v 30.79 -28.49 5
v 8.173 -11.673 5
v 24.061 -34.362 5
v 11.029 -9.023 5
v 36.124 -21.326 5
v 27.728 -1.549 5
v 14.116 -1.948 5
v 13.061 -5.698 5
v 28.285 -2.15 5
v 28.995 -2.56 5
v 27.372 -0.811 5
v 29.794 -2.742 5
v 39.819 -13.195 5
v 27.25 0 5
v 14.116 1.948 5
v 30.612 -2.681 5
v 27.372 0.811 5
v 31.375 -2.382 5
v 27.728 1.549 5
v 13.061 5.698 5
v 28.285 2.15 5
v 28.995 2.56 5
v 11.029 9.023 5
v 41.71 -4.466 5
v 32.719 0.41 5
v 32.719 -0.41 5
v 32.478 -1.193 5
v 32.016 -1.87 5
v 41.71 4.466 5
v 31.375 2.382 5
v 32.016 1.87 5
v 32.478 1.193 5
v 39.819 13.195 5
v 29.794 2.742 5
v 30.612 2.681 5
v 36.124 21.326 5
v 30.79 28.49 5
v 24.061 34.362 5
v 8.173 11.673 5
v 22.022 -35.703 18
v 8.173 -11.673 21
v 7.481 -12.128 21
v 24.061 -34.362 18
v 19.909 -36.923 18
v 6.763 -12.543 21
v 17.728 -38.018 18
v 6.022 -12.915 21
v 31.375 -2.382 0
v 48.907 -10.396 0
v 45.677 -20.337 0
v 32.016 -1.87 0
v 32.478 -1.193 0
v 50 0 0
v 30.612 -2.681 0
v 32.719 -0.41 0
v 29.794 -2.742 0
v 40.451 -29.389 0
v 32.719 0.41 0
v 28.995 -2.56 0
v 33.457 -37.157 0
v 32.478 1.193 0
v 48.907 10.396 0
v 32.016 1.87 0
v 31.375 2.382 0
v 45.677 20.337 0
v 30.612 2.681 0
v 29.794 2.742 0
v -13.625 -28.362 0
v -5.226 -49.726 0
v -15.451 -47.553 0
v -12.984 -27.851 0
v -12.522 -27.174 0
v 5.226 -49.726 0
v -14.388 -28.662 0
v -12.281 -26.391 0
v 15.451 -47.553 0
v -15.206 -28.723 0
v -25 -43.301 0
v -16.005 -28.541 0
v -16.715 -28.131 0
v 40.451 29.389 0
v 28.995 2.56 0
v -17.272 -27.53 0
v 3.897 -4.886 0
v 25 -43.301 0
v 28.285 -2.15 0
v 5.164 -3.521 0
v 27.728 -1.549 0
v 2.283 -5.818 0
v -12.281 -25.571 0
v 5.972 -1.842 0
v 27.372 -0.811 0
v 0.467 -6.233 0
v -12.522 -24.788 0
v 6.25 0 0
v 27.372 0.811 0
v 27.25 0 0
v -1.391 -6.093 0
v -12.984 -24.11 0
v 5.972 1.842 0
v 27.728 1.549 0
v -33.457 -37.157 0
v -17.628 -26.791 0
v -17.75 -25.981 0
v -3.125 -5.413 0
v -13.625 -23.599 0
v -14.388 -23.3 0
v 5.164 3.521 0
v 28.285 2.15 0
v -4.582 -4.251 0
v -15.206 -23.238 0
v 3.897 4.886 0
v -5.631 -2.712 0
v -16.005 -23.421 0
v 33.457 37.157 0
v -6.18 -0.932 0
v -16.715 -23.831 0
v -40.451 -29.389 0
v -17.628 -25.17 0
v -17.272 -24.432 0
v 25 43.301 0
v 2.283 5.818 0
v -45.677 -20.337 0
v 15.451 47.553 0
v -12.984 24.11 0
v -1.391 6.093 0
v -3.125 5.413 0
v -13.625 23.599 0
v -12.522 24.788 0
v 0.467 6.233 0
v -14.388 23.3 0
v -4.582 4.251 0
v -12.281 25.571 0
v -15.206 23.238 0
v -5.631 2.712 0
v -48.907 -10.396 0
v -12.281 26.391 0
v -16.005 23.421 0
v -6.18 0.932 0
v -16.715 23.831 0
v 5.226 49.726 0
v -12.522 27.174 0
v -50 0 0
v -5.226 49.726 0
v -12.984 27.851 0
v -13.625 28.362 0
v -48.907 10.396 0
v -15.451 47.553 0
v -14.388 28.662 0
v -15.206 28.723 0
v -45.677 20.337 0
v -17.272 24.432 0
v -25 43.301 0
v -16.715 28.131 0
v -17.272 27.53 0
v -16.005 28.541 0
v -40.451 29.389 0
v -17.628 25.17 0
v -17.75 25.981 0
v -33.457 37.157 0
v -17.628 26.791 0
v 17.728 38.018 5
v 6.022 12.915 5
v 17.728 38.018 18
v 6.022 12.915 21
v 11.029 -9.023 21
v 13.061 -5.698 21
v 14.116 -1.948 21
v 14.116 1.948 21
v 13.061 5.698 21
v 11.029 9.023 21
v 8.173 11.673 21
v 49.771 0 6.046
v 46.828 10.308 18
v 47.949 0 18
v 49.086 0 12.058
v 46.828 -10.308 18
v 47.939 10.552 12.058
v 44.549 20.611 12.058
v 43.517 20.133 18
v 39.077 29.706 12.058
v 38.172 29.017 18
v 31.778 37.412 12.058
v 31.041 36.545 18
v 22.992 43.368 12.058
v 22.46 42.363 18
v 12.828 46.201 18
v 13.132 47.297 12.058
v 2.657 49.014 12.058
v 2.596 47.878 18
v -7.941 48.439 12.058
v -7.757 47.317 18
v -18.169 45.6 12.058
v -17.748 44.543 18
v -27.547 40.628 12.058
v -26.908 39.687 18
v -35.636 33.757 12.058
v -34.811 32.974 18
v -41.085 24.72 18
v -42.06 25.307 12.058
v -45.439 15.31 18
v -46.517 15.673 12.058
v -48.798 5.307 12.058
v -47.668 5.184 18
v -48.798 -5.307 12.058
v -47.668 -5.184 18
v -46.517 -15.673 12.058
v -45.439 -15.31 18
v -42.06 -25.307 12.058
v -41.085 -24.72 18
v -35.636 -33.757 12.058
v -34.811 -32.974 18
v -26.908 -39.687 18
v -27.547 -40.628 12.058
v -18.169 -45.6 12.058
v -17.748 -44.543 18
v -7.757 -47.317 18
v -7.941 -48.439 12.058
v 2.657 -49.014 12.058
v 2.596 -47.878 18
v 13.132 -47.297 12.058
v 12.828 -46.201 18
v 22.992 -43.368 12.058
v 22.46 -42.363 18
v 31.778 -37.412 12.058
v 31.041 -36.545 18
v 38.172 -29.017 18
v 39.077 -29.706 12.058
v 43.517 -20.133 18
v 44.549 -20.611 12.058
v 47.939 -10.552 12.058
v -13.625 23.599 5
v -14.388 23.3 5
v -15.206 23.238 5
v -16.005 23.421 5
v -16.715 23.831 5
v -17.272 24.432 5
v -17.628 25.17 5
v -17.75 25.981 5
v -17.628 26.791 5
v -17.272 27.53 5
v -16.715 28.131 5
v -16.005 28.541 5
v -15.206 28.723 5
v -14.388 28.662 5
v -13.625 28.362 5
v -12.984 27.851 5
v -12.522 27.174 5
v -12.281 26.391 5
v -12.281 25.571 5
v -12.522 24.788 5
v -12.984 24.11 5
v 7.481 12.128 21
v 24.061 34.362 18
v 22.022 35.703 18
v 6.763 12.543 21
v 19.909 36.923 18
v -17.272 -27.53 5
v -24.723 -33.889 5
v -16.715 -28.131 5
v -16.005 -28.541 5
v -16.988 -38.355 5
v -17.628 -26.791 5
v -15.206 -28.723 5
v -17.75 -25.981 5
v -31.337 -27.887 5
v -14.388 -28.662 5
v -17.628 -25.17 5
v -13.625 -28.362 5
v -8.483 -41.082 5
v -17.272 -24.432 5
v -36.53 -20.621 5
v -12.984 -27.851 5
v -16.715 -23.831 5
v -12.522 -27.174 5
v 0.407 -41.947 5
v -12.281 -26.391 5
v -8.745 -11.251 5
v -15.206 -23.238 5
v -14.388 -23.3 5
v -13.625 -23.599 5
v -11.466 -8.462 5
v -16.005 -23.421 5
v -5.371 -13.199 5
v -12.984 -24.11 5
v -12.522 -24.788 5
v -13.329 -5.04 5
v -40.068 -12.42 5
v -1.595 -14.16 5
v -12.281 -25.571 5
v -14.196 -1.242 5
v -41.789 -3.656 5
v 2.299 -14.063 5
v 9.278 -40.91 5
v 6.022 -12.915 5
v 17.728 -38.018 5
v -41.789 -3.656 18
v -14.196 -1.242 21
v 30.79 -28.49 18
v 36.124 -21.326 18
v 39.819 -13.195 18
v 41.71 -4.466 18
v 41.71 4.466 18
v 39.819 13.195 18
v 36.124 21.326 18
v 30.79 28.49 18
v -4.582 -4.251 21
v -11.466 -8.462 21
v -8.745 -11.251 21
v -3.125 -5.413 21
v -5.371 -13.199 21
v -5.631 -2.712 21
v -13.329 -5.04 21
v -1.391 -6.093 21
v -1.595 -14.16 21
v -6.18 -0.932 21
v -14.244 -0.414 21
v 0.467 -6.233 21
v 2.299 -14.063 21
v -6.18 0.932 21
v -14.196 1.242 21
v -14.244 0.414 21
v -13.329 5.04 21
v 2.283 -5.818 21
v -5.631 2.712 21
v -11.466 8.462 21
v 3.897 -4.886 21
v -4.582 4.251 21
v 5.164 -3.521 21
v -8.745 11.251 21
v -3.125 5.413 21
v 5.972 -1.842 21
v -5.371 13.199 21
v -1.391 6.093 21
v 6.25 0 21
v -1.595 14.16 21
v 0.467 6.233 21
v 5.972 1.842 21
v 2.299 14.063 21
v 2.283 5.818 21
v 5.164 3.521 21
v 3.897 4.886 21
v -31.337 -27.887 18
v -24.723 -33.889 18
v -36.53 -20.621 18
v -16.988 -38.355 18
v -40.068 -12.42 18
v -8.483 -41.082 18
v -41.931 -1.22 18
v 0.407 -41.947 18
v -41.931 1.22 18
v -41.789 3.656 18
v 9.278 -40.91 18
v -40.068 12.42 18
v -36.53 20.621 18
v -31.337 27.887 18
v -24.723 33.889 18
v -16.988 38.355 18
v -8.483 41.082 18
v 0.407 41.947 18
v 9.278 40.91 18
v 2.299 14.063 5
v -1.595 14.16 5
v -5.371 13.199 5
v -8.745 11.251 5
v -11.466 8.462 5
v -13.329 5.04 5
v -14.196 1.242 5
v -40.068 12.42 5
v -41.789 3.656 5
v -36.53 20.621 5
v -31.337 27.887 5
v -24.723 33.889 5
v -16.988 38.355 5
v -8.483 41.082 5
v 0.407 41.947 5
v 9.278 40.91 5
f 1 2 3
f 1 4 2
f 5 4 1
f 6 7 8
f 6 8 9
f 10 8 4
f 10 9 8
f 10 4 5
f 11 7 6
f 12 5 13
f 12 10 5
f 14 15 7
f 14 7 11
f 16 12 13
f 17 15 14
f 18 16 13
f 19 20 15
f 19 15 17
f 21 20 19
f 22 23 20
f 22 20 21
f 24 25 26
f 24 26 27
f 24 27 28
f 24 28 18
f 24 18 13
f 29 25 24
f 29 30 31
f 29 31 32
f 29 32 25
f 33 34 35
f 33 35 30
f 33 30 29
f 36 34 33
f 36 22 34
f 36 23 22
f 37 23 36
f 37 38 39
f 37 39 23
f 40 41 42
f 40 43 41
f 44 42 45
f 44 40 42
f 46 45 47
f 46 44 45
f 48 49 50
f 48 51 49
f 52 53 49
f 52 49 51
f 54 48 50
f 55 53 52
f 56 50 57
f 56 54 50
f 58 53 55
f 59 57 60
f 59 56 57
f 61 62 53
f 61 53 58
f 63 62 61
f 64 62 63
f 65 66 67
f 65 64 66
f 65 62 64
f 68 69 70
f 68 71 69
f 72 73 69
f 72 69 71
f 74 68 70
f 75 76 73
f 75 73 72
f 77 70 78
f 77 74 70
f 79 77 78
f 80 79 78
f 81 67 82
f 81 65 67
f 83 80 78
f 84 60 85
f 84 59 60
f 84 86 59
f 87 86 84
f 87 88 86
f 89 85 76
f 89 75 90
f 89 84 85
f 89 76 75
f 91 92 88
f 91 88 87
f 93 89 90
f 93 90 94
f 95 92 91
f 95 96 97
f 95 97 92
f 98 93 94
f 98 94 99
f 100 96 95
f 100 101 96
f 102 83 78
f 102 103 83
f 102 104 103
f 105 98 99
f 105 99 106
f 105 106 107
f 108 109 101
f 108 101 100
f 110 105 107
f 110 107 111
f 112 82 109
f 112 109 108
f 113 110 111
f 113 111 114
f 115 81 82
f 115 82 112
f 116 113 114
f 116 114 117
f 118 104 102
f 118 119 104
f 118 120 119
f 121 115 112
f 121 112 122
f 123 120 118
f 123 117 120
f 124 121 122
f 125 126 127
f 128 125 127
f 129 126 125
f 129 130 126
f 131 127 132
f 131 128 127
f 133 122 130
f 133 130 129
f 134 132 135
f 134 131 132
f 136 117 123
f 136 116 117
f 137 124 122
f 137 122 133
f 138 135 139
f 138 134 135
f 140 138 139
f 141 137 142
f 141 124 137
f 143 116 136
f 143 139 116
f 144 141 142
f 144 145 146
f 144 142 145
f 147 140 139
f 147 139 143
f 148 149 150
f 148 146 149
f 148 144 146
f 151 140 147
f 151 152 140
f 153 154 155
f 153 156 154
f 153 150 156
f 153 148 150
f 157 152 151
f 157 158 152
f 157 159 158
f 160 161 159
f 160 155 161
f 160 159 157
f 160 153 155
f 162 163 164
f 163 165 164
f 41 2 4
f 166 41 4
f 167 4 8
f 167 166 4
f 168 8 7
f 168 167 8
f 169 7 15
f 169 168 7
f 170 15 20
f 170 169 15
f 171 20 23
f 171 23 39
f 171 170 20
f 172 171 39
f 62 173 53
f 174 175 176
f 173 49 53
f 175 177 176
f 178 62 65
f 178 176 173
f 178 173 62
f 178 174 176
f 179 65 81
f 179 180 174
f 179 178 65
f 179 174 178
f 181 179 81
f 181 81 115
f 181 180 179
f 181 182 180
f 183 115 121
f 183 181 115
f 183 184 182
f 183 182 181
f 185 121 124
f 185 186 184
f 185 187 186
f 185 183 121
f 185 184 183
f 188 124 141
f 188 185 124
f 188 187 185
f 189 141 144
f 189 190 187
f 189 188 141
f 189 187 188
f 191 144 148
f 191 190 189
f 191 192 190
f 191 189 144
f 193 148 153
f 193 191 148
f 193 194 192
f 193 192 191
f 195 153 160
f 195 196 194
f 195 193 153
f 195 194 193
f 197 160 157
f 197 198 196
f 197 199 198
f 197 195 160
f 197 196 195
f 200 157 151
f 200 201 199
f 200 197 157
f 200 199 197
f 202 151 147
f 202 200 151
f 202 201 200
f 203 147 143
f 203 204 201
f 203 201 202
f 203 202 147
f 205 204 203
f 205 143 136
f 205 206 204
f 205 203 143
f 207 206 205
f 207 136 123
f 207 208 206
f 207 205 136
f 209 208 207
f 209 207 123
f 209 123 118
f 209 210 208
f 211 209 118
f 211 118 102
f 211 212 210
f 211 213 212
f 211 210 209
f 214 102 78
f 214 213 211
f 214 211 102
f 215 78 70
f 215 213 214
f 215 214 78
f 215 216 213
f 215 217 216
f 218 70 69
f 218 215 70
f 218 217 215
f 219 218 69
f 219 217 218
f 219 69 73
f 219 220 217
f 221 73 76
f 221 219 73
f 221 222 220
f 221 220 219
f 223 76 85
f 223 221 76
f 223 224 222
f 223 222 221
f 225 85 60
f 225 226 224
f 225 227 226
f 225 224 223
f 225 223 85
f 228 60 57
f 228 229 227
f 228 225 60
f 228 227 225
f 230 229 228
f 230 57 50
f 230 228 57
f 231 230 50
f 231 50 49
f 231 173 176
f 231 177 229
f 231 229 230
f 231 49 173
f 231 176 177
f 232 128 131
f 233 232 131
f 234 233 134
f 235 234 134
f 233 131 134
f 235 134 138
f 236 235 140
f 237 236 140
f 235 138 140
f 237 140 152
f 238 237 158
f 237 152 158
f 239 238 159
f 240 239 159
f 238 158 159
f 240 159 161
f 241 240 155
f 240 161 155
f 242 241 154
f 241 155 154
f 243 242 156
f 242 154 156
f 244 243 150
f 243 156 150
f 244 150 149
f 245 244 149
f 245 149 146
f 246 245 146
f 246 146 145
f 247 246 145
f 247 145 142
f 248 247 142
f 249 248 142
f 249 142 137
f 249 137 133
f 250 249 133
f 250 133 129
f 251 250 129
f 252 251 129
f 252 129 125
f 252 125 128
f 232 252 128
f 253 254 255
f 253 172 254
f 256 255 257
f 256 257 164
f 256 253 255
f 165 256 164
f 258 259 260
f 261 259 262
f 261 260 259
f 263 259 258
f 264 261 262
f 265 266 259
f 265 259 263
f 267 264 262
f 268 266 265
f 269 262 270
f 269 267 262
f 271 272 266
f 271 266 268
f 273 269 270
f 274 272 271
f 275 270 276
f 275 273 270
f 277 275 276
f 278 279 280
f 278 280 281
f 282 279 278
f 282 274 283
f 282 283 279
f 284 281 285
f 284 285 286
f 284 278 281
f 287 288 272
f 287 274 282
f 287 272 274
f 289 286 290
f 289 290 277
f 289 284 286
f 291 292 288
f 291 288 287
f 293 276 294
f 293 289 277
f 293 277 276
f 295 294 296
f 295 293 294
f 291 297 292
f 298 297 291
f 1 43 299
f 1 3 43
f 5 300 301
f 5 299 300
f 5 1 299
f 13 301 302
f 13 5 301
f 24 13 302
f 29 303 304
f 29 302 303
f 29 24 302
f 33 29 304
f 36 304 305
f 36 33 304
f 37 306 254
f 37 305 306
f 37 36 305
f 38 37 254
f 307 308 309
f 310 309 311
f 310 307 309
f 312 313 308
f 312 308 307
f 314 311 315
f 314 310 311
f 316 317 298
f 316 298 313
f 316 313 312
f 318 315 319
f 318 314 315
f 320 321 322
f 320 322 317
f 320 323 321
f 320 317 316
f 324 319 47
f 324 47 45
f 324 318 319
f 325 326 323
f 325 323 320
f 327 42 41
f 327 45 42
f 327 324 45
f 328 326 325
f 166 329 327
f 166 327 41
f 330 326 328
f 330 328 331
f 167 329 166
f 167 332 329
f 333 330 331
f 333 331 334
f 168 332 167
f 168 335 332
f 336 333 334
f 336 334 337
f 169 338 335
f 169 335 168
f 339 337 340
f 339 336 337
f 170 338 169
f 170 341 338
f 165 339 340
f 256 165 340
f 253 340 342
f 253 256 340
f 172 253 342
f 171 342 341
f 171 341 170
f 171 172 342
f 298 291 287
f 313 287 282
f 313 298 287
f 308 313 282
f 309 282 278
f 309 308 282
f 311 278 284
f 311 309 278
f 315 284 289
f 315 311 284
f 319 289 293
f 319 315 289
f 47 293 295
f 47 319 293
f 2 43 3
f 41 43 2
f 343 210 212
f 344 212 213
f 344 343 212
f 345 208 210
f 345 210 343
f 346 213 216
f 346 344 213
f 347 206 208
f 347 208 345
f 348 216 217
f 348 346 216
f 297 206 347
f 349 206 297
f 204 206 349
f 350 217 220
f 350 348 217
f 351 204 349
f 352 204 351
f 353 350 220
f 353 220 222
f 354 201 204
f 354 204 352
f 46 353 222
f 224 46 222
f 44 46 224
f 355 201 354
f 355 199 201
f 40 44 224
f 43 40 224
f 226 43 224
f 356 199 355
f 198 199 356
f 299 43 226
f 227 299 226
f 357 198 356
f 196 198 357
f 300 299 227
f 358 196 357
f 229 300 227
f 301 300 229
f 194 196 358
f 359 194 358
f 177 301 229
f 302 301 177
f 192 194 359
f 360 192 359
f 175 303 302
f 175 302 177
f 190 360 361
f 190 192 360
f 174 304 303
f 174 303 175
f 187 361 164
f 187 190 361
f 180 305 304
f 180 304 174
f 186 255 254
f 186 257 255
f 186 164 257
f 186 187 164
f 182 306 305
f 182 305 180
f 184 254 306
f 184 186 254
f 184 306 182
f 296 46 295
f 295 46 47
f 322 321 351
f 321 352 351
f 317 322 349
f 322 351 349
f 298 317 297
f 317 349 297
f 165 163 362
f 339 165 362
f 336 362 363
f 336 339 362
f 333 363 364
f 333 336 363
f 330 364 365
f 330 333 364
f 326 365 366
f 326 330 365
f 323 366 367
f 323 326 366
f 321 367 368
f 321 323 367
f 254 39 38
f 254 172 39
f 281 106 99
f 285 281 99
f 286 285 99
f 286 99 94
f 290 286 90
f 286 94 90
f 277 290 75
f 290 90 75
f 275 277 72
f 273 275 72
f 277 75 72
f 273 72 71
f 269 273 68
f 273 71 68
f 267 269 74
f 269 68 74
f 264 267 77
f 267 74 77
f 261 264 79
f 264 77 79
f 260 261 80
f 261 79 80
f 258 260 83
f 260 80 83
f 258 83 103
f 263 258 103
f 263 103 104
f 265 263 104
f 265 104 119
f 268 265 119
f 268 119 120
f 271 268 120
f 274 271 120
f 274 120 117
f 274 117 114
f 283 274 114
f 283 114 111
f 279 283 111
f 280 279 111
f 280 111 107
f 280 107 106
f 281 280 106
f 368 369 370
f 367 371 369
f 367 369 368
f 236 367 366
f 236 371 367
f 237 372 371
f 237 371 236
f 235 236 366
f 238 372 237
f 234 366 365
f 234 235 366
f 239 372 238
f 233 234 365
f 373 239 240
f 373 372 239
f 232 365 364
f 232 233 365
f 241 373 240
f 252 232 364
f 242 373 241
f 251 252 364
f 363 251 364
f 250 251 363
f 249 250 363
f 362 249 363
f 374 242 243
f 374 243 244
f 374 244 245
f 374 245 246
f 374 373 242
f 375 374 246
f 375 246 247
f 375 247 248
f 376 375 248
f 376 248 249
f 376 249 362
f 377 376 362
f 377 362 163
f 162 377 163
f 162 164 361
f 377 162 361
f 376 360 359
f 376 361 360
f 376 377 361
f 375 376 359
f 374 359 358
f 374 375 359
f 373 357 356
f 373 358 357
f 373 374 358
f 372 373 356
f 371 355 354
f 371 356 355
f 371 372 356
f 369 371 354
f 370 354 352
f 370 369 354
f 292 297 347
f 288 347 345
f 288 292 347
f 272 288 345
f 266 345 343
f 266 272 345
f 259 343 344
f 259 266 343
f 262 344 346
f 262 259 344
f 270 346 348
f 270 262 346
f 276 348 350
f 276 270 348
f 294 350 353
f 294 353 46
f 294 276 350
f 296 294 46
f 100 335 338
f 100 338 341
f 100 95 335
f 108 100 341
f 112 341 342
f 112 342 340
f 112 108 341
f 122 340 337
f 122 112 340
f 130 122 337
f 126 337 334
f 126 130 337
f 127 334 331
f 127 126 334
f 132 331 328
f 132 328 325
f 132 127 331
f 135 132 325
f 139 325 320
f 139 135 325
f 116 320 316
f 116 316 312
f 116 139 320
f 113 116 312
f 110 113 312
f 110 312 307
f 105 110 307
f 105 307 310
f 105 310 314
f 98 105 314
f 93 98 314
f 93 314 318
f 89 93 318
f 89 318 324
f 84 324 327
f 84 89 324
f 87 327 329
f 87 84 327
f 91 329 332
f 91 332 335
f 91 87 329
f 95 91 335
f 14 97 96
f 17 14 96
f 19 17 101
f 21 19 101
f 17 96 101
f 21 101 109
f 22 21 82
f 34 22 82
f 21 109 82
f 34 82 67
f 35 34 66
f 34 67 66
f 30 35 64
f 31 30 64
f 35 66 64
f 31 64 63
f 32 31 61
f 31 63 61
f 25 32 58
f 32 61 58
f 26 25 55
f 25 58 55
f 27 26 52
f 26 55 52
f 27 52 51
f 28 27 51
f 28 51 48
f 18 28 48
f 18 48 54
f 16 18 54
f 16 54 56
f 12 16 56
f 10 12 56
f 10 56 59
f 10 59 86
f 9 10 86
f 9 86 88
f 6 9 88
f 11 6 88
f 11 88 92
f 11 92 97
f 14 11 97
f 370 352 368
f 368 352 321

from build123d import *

# Parameters (mm, degrees)
F3_ANGLE_BACK   = 5
F3_ANGLE        = 10
F5_D            = 5.5
F5_COPIES_COUNT = 3
F8_ANGLE_BACK   = 5
F8_ANGLE        = 10


# Not quite as in the source:
# - a pattern or mirror of a feature is missing from the dataset's text; its kind, count and spacing are read off the source's solid


with BuildPart() as f1:
    # F0 (on Front) → F1 (revolve)
    with BuildSketch(Plane.XZ):
        with BuildLine():
            Line((41.9487010796, 5), (14.25, 5))
            Line((14.25, 5), (14.25, 21))
            Line((14.25, 21), (6.25, 21))
            Line((6.25, 21), (6.25, 0))
            Line((6.25, 0), (50, 0))
            ThreePointArc((50, 0), (49.4855209657, 9.058253519), (47.9487010796, 18))
            Line((47.9487010796, 18), (41.9487010796, 18))
            Line((41.9487010796, 18), (41.9487010796, 5))
        make_face()
    revolve(axis=Axis((0, 0, 8.5228504971), (0, 0, 1)))

    # F2 (on Front) → F3 (revolve)
    with BuildSketch(Plane.XZ, mode=Mode.PRIVATE) as f3_sk:
        Polygon((-14.25, 21), (-41.9487010796, 18), (-41.9487010796, 5), (-14.25, 5), align=None)
    f3 = revolve(f3_sk.sketch.rotate(Axis((0, 0, 5), (0, 0, 1)), -F3_ANGLE_BACK), axis=Axis((0, 0, 5), (0, 0, 1)), revolution_arc=F3_ANGLE)

    # F3_copies: F3 across plane
    add(f3.mirror(Plane(origin=(0, 0, 0), x_dir=(0.5, 0.8660254038, 0), z_dir=(0.8660254038, -0.5, 0))))

    # F5 (through all)
    with Locations(Plane.XY.offset(5)):
        with Locations((30, 0)):
            f5 = Hole(F5_D / 2)

    # F5_copies: F5 ×3 about axis
    f5_copies_axis = Axis((0, 0, 0), (0, 0, 1))
    for i in range(1, F5_COPIES_COUNT):
        add(f5.rotate(f5_copies_axis, i * 360 / F5_COPIES_COUNT), mode=Mode.SUBTRACT)

    # F7 (on face) → F8 (revolve)
    with BuildSketch(Plane(origin=(0, 0, 0), x_dir=(0.5, 0.8660254038, 0), z_dir=(0.8660254038, -0.5, 0)), mode=Mode.PRIVATE) as f8_sk:
        Polygon((14.25, 5), (41.9487010796, 5), (41.9487010796, 18), (14.25, 21), align=None)
    revolve(f8_sk.sketch.rotate(Axis((0, 0, 5), (0, 0, 1)), -F8_ANGLE_BACK), axis=Axis((0, 0, 5), (0, 0, 1)), revolution_arc=F8_ANGLE)


solid = f1.part
